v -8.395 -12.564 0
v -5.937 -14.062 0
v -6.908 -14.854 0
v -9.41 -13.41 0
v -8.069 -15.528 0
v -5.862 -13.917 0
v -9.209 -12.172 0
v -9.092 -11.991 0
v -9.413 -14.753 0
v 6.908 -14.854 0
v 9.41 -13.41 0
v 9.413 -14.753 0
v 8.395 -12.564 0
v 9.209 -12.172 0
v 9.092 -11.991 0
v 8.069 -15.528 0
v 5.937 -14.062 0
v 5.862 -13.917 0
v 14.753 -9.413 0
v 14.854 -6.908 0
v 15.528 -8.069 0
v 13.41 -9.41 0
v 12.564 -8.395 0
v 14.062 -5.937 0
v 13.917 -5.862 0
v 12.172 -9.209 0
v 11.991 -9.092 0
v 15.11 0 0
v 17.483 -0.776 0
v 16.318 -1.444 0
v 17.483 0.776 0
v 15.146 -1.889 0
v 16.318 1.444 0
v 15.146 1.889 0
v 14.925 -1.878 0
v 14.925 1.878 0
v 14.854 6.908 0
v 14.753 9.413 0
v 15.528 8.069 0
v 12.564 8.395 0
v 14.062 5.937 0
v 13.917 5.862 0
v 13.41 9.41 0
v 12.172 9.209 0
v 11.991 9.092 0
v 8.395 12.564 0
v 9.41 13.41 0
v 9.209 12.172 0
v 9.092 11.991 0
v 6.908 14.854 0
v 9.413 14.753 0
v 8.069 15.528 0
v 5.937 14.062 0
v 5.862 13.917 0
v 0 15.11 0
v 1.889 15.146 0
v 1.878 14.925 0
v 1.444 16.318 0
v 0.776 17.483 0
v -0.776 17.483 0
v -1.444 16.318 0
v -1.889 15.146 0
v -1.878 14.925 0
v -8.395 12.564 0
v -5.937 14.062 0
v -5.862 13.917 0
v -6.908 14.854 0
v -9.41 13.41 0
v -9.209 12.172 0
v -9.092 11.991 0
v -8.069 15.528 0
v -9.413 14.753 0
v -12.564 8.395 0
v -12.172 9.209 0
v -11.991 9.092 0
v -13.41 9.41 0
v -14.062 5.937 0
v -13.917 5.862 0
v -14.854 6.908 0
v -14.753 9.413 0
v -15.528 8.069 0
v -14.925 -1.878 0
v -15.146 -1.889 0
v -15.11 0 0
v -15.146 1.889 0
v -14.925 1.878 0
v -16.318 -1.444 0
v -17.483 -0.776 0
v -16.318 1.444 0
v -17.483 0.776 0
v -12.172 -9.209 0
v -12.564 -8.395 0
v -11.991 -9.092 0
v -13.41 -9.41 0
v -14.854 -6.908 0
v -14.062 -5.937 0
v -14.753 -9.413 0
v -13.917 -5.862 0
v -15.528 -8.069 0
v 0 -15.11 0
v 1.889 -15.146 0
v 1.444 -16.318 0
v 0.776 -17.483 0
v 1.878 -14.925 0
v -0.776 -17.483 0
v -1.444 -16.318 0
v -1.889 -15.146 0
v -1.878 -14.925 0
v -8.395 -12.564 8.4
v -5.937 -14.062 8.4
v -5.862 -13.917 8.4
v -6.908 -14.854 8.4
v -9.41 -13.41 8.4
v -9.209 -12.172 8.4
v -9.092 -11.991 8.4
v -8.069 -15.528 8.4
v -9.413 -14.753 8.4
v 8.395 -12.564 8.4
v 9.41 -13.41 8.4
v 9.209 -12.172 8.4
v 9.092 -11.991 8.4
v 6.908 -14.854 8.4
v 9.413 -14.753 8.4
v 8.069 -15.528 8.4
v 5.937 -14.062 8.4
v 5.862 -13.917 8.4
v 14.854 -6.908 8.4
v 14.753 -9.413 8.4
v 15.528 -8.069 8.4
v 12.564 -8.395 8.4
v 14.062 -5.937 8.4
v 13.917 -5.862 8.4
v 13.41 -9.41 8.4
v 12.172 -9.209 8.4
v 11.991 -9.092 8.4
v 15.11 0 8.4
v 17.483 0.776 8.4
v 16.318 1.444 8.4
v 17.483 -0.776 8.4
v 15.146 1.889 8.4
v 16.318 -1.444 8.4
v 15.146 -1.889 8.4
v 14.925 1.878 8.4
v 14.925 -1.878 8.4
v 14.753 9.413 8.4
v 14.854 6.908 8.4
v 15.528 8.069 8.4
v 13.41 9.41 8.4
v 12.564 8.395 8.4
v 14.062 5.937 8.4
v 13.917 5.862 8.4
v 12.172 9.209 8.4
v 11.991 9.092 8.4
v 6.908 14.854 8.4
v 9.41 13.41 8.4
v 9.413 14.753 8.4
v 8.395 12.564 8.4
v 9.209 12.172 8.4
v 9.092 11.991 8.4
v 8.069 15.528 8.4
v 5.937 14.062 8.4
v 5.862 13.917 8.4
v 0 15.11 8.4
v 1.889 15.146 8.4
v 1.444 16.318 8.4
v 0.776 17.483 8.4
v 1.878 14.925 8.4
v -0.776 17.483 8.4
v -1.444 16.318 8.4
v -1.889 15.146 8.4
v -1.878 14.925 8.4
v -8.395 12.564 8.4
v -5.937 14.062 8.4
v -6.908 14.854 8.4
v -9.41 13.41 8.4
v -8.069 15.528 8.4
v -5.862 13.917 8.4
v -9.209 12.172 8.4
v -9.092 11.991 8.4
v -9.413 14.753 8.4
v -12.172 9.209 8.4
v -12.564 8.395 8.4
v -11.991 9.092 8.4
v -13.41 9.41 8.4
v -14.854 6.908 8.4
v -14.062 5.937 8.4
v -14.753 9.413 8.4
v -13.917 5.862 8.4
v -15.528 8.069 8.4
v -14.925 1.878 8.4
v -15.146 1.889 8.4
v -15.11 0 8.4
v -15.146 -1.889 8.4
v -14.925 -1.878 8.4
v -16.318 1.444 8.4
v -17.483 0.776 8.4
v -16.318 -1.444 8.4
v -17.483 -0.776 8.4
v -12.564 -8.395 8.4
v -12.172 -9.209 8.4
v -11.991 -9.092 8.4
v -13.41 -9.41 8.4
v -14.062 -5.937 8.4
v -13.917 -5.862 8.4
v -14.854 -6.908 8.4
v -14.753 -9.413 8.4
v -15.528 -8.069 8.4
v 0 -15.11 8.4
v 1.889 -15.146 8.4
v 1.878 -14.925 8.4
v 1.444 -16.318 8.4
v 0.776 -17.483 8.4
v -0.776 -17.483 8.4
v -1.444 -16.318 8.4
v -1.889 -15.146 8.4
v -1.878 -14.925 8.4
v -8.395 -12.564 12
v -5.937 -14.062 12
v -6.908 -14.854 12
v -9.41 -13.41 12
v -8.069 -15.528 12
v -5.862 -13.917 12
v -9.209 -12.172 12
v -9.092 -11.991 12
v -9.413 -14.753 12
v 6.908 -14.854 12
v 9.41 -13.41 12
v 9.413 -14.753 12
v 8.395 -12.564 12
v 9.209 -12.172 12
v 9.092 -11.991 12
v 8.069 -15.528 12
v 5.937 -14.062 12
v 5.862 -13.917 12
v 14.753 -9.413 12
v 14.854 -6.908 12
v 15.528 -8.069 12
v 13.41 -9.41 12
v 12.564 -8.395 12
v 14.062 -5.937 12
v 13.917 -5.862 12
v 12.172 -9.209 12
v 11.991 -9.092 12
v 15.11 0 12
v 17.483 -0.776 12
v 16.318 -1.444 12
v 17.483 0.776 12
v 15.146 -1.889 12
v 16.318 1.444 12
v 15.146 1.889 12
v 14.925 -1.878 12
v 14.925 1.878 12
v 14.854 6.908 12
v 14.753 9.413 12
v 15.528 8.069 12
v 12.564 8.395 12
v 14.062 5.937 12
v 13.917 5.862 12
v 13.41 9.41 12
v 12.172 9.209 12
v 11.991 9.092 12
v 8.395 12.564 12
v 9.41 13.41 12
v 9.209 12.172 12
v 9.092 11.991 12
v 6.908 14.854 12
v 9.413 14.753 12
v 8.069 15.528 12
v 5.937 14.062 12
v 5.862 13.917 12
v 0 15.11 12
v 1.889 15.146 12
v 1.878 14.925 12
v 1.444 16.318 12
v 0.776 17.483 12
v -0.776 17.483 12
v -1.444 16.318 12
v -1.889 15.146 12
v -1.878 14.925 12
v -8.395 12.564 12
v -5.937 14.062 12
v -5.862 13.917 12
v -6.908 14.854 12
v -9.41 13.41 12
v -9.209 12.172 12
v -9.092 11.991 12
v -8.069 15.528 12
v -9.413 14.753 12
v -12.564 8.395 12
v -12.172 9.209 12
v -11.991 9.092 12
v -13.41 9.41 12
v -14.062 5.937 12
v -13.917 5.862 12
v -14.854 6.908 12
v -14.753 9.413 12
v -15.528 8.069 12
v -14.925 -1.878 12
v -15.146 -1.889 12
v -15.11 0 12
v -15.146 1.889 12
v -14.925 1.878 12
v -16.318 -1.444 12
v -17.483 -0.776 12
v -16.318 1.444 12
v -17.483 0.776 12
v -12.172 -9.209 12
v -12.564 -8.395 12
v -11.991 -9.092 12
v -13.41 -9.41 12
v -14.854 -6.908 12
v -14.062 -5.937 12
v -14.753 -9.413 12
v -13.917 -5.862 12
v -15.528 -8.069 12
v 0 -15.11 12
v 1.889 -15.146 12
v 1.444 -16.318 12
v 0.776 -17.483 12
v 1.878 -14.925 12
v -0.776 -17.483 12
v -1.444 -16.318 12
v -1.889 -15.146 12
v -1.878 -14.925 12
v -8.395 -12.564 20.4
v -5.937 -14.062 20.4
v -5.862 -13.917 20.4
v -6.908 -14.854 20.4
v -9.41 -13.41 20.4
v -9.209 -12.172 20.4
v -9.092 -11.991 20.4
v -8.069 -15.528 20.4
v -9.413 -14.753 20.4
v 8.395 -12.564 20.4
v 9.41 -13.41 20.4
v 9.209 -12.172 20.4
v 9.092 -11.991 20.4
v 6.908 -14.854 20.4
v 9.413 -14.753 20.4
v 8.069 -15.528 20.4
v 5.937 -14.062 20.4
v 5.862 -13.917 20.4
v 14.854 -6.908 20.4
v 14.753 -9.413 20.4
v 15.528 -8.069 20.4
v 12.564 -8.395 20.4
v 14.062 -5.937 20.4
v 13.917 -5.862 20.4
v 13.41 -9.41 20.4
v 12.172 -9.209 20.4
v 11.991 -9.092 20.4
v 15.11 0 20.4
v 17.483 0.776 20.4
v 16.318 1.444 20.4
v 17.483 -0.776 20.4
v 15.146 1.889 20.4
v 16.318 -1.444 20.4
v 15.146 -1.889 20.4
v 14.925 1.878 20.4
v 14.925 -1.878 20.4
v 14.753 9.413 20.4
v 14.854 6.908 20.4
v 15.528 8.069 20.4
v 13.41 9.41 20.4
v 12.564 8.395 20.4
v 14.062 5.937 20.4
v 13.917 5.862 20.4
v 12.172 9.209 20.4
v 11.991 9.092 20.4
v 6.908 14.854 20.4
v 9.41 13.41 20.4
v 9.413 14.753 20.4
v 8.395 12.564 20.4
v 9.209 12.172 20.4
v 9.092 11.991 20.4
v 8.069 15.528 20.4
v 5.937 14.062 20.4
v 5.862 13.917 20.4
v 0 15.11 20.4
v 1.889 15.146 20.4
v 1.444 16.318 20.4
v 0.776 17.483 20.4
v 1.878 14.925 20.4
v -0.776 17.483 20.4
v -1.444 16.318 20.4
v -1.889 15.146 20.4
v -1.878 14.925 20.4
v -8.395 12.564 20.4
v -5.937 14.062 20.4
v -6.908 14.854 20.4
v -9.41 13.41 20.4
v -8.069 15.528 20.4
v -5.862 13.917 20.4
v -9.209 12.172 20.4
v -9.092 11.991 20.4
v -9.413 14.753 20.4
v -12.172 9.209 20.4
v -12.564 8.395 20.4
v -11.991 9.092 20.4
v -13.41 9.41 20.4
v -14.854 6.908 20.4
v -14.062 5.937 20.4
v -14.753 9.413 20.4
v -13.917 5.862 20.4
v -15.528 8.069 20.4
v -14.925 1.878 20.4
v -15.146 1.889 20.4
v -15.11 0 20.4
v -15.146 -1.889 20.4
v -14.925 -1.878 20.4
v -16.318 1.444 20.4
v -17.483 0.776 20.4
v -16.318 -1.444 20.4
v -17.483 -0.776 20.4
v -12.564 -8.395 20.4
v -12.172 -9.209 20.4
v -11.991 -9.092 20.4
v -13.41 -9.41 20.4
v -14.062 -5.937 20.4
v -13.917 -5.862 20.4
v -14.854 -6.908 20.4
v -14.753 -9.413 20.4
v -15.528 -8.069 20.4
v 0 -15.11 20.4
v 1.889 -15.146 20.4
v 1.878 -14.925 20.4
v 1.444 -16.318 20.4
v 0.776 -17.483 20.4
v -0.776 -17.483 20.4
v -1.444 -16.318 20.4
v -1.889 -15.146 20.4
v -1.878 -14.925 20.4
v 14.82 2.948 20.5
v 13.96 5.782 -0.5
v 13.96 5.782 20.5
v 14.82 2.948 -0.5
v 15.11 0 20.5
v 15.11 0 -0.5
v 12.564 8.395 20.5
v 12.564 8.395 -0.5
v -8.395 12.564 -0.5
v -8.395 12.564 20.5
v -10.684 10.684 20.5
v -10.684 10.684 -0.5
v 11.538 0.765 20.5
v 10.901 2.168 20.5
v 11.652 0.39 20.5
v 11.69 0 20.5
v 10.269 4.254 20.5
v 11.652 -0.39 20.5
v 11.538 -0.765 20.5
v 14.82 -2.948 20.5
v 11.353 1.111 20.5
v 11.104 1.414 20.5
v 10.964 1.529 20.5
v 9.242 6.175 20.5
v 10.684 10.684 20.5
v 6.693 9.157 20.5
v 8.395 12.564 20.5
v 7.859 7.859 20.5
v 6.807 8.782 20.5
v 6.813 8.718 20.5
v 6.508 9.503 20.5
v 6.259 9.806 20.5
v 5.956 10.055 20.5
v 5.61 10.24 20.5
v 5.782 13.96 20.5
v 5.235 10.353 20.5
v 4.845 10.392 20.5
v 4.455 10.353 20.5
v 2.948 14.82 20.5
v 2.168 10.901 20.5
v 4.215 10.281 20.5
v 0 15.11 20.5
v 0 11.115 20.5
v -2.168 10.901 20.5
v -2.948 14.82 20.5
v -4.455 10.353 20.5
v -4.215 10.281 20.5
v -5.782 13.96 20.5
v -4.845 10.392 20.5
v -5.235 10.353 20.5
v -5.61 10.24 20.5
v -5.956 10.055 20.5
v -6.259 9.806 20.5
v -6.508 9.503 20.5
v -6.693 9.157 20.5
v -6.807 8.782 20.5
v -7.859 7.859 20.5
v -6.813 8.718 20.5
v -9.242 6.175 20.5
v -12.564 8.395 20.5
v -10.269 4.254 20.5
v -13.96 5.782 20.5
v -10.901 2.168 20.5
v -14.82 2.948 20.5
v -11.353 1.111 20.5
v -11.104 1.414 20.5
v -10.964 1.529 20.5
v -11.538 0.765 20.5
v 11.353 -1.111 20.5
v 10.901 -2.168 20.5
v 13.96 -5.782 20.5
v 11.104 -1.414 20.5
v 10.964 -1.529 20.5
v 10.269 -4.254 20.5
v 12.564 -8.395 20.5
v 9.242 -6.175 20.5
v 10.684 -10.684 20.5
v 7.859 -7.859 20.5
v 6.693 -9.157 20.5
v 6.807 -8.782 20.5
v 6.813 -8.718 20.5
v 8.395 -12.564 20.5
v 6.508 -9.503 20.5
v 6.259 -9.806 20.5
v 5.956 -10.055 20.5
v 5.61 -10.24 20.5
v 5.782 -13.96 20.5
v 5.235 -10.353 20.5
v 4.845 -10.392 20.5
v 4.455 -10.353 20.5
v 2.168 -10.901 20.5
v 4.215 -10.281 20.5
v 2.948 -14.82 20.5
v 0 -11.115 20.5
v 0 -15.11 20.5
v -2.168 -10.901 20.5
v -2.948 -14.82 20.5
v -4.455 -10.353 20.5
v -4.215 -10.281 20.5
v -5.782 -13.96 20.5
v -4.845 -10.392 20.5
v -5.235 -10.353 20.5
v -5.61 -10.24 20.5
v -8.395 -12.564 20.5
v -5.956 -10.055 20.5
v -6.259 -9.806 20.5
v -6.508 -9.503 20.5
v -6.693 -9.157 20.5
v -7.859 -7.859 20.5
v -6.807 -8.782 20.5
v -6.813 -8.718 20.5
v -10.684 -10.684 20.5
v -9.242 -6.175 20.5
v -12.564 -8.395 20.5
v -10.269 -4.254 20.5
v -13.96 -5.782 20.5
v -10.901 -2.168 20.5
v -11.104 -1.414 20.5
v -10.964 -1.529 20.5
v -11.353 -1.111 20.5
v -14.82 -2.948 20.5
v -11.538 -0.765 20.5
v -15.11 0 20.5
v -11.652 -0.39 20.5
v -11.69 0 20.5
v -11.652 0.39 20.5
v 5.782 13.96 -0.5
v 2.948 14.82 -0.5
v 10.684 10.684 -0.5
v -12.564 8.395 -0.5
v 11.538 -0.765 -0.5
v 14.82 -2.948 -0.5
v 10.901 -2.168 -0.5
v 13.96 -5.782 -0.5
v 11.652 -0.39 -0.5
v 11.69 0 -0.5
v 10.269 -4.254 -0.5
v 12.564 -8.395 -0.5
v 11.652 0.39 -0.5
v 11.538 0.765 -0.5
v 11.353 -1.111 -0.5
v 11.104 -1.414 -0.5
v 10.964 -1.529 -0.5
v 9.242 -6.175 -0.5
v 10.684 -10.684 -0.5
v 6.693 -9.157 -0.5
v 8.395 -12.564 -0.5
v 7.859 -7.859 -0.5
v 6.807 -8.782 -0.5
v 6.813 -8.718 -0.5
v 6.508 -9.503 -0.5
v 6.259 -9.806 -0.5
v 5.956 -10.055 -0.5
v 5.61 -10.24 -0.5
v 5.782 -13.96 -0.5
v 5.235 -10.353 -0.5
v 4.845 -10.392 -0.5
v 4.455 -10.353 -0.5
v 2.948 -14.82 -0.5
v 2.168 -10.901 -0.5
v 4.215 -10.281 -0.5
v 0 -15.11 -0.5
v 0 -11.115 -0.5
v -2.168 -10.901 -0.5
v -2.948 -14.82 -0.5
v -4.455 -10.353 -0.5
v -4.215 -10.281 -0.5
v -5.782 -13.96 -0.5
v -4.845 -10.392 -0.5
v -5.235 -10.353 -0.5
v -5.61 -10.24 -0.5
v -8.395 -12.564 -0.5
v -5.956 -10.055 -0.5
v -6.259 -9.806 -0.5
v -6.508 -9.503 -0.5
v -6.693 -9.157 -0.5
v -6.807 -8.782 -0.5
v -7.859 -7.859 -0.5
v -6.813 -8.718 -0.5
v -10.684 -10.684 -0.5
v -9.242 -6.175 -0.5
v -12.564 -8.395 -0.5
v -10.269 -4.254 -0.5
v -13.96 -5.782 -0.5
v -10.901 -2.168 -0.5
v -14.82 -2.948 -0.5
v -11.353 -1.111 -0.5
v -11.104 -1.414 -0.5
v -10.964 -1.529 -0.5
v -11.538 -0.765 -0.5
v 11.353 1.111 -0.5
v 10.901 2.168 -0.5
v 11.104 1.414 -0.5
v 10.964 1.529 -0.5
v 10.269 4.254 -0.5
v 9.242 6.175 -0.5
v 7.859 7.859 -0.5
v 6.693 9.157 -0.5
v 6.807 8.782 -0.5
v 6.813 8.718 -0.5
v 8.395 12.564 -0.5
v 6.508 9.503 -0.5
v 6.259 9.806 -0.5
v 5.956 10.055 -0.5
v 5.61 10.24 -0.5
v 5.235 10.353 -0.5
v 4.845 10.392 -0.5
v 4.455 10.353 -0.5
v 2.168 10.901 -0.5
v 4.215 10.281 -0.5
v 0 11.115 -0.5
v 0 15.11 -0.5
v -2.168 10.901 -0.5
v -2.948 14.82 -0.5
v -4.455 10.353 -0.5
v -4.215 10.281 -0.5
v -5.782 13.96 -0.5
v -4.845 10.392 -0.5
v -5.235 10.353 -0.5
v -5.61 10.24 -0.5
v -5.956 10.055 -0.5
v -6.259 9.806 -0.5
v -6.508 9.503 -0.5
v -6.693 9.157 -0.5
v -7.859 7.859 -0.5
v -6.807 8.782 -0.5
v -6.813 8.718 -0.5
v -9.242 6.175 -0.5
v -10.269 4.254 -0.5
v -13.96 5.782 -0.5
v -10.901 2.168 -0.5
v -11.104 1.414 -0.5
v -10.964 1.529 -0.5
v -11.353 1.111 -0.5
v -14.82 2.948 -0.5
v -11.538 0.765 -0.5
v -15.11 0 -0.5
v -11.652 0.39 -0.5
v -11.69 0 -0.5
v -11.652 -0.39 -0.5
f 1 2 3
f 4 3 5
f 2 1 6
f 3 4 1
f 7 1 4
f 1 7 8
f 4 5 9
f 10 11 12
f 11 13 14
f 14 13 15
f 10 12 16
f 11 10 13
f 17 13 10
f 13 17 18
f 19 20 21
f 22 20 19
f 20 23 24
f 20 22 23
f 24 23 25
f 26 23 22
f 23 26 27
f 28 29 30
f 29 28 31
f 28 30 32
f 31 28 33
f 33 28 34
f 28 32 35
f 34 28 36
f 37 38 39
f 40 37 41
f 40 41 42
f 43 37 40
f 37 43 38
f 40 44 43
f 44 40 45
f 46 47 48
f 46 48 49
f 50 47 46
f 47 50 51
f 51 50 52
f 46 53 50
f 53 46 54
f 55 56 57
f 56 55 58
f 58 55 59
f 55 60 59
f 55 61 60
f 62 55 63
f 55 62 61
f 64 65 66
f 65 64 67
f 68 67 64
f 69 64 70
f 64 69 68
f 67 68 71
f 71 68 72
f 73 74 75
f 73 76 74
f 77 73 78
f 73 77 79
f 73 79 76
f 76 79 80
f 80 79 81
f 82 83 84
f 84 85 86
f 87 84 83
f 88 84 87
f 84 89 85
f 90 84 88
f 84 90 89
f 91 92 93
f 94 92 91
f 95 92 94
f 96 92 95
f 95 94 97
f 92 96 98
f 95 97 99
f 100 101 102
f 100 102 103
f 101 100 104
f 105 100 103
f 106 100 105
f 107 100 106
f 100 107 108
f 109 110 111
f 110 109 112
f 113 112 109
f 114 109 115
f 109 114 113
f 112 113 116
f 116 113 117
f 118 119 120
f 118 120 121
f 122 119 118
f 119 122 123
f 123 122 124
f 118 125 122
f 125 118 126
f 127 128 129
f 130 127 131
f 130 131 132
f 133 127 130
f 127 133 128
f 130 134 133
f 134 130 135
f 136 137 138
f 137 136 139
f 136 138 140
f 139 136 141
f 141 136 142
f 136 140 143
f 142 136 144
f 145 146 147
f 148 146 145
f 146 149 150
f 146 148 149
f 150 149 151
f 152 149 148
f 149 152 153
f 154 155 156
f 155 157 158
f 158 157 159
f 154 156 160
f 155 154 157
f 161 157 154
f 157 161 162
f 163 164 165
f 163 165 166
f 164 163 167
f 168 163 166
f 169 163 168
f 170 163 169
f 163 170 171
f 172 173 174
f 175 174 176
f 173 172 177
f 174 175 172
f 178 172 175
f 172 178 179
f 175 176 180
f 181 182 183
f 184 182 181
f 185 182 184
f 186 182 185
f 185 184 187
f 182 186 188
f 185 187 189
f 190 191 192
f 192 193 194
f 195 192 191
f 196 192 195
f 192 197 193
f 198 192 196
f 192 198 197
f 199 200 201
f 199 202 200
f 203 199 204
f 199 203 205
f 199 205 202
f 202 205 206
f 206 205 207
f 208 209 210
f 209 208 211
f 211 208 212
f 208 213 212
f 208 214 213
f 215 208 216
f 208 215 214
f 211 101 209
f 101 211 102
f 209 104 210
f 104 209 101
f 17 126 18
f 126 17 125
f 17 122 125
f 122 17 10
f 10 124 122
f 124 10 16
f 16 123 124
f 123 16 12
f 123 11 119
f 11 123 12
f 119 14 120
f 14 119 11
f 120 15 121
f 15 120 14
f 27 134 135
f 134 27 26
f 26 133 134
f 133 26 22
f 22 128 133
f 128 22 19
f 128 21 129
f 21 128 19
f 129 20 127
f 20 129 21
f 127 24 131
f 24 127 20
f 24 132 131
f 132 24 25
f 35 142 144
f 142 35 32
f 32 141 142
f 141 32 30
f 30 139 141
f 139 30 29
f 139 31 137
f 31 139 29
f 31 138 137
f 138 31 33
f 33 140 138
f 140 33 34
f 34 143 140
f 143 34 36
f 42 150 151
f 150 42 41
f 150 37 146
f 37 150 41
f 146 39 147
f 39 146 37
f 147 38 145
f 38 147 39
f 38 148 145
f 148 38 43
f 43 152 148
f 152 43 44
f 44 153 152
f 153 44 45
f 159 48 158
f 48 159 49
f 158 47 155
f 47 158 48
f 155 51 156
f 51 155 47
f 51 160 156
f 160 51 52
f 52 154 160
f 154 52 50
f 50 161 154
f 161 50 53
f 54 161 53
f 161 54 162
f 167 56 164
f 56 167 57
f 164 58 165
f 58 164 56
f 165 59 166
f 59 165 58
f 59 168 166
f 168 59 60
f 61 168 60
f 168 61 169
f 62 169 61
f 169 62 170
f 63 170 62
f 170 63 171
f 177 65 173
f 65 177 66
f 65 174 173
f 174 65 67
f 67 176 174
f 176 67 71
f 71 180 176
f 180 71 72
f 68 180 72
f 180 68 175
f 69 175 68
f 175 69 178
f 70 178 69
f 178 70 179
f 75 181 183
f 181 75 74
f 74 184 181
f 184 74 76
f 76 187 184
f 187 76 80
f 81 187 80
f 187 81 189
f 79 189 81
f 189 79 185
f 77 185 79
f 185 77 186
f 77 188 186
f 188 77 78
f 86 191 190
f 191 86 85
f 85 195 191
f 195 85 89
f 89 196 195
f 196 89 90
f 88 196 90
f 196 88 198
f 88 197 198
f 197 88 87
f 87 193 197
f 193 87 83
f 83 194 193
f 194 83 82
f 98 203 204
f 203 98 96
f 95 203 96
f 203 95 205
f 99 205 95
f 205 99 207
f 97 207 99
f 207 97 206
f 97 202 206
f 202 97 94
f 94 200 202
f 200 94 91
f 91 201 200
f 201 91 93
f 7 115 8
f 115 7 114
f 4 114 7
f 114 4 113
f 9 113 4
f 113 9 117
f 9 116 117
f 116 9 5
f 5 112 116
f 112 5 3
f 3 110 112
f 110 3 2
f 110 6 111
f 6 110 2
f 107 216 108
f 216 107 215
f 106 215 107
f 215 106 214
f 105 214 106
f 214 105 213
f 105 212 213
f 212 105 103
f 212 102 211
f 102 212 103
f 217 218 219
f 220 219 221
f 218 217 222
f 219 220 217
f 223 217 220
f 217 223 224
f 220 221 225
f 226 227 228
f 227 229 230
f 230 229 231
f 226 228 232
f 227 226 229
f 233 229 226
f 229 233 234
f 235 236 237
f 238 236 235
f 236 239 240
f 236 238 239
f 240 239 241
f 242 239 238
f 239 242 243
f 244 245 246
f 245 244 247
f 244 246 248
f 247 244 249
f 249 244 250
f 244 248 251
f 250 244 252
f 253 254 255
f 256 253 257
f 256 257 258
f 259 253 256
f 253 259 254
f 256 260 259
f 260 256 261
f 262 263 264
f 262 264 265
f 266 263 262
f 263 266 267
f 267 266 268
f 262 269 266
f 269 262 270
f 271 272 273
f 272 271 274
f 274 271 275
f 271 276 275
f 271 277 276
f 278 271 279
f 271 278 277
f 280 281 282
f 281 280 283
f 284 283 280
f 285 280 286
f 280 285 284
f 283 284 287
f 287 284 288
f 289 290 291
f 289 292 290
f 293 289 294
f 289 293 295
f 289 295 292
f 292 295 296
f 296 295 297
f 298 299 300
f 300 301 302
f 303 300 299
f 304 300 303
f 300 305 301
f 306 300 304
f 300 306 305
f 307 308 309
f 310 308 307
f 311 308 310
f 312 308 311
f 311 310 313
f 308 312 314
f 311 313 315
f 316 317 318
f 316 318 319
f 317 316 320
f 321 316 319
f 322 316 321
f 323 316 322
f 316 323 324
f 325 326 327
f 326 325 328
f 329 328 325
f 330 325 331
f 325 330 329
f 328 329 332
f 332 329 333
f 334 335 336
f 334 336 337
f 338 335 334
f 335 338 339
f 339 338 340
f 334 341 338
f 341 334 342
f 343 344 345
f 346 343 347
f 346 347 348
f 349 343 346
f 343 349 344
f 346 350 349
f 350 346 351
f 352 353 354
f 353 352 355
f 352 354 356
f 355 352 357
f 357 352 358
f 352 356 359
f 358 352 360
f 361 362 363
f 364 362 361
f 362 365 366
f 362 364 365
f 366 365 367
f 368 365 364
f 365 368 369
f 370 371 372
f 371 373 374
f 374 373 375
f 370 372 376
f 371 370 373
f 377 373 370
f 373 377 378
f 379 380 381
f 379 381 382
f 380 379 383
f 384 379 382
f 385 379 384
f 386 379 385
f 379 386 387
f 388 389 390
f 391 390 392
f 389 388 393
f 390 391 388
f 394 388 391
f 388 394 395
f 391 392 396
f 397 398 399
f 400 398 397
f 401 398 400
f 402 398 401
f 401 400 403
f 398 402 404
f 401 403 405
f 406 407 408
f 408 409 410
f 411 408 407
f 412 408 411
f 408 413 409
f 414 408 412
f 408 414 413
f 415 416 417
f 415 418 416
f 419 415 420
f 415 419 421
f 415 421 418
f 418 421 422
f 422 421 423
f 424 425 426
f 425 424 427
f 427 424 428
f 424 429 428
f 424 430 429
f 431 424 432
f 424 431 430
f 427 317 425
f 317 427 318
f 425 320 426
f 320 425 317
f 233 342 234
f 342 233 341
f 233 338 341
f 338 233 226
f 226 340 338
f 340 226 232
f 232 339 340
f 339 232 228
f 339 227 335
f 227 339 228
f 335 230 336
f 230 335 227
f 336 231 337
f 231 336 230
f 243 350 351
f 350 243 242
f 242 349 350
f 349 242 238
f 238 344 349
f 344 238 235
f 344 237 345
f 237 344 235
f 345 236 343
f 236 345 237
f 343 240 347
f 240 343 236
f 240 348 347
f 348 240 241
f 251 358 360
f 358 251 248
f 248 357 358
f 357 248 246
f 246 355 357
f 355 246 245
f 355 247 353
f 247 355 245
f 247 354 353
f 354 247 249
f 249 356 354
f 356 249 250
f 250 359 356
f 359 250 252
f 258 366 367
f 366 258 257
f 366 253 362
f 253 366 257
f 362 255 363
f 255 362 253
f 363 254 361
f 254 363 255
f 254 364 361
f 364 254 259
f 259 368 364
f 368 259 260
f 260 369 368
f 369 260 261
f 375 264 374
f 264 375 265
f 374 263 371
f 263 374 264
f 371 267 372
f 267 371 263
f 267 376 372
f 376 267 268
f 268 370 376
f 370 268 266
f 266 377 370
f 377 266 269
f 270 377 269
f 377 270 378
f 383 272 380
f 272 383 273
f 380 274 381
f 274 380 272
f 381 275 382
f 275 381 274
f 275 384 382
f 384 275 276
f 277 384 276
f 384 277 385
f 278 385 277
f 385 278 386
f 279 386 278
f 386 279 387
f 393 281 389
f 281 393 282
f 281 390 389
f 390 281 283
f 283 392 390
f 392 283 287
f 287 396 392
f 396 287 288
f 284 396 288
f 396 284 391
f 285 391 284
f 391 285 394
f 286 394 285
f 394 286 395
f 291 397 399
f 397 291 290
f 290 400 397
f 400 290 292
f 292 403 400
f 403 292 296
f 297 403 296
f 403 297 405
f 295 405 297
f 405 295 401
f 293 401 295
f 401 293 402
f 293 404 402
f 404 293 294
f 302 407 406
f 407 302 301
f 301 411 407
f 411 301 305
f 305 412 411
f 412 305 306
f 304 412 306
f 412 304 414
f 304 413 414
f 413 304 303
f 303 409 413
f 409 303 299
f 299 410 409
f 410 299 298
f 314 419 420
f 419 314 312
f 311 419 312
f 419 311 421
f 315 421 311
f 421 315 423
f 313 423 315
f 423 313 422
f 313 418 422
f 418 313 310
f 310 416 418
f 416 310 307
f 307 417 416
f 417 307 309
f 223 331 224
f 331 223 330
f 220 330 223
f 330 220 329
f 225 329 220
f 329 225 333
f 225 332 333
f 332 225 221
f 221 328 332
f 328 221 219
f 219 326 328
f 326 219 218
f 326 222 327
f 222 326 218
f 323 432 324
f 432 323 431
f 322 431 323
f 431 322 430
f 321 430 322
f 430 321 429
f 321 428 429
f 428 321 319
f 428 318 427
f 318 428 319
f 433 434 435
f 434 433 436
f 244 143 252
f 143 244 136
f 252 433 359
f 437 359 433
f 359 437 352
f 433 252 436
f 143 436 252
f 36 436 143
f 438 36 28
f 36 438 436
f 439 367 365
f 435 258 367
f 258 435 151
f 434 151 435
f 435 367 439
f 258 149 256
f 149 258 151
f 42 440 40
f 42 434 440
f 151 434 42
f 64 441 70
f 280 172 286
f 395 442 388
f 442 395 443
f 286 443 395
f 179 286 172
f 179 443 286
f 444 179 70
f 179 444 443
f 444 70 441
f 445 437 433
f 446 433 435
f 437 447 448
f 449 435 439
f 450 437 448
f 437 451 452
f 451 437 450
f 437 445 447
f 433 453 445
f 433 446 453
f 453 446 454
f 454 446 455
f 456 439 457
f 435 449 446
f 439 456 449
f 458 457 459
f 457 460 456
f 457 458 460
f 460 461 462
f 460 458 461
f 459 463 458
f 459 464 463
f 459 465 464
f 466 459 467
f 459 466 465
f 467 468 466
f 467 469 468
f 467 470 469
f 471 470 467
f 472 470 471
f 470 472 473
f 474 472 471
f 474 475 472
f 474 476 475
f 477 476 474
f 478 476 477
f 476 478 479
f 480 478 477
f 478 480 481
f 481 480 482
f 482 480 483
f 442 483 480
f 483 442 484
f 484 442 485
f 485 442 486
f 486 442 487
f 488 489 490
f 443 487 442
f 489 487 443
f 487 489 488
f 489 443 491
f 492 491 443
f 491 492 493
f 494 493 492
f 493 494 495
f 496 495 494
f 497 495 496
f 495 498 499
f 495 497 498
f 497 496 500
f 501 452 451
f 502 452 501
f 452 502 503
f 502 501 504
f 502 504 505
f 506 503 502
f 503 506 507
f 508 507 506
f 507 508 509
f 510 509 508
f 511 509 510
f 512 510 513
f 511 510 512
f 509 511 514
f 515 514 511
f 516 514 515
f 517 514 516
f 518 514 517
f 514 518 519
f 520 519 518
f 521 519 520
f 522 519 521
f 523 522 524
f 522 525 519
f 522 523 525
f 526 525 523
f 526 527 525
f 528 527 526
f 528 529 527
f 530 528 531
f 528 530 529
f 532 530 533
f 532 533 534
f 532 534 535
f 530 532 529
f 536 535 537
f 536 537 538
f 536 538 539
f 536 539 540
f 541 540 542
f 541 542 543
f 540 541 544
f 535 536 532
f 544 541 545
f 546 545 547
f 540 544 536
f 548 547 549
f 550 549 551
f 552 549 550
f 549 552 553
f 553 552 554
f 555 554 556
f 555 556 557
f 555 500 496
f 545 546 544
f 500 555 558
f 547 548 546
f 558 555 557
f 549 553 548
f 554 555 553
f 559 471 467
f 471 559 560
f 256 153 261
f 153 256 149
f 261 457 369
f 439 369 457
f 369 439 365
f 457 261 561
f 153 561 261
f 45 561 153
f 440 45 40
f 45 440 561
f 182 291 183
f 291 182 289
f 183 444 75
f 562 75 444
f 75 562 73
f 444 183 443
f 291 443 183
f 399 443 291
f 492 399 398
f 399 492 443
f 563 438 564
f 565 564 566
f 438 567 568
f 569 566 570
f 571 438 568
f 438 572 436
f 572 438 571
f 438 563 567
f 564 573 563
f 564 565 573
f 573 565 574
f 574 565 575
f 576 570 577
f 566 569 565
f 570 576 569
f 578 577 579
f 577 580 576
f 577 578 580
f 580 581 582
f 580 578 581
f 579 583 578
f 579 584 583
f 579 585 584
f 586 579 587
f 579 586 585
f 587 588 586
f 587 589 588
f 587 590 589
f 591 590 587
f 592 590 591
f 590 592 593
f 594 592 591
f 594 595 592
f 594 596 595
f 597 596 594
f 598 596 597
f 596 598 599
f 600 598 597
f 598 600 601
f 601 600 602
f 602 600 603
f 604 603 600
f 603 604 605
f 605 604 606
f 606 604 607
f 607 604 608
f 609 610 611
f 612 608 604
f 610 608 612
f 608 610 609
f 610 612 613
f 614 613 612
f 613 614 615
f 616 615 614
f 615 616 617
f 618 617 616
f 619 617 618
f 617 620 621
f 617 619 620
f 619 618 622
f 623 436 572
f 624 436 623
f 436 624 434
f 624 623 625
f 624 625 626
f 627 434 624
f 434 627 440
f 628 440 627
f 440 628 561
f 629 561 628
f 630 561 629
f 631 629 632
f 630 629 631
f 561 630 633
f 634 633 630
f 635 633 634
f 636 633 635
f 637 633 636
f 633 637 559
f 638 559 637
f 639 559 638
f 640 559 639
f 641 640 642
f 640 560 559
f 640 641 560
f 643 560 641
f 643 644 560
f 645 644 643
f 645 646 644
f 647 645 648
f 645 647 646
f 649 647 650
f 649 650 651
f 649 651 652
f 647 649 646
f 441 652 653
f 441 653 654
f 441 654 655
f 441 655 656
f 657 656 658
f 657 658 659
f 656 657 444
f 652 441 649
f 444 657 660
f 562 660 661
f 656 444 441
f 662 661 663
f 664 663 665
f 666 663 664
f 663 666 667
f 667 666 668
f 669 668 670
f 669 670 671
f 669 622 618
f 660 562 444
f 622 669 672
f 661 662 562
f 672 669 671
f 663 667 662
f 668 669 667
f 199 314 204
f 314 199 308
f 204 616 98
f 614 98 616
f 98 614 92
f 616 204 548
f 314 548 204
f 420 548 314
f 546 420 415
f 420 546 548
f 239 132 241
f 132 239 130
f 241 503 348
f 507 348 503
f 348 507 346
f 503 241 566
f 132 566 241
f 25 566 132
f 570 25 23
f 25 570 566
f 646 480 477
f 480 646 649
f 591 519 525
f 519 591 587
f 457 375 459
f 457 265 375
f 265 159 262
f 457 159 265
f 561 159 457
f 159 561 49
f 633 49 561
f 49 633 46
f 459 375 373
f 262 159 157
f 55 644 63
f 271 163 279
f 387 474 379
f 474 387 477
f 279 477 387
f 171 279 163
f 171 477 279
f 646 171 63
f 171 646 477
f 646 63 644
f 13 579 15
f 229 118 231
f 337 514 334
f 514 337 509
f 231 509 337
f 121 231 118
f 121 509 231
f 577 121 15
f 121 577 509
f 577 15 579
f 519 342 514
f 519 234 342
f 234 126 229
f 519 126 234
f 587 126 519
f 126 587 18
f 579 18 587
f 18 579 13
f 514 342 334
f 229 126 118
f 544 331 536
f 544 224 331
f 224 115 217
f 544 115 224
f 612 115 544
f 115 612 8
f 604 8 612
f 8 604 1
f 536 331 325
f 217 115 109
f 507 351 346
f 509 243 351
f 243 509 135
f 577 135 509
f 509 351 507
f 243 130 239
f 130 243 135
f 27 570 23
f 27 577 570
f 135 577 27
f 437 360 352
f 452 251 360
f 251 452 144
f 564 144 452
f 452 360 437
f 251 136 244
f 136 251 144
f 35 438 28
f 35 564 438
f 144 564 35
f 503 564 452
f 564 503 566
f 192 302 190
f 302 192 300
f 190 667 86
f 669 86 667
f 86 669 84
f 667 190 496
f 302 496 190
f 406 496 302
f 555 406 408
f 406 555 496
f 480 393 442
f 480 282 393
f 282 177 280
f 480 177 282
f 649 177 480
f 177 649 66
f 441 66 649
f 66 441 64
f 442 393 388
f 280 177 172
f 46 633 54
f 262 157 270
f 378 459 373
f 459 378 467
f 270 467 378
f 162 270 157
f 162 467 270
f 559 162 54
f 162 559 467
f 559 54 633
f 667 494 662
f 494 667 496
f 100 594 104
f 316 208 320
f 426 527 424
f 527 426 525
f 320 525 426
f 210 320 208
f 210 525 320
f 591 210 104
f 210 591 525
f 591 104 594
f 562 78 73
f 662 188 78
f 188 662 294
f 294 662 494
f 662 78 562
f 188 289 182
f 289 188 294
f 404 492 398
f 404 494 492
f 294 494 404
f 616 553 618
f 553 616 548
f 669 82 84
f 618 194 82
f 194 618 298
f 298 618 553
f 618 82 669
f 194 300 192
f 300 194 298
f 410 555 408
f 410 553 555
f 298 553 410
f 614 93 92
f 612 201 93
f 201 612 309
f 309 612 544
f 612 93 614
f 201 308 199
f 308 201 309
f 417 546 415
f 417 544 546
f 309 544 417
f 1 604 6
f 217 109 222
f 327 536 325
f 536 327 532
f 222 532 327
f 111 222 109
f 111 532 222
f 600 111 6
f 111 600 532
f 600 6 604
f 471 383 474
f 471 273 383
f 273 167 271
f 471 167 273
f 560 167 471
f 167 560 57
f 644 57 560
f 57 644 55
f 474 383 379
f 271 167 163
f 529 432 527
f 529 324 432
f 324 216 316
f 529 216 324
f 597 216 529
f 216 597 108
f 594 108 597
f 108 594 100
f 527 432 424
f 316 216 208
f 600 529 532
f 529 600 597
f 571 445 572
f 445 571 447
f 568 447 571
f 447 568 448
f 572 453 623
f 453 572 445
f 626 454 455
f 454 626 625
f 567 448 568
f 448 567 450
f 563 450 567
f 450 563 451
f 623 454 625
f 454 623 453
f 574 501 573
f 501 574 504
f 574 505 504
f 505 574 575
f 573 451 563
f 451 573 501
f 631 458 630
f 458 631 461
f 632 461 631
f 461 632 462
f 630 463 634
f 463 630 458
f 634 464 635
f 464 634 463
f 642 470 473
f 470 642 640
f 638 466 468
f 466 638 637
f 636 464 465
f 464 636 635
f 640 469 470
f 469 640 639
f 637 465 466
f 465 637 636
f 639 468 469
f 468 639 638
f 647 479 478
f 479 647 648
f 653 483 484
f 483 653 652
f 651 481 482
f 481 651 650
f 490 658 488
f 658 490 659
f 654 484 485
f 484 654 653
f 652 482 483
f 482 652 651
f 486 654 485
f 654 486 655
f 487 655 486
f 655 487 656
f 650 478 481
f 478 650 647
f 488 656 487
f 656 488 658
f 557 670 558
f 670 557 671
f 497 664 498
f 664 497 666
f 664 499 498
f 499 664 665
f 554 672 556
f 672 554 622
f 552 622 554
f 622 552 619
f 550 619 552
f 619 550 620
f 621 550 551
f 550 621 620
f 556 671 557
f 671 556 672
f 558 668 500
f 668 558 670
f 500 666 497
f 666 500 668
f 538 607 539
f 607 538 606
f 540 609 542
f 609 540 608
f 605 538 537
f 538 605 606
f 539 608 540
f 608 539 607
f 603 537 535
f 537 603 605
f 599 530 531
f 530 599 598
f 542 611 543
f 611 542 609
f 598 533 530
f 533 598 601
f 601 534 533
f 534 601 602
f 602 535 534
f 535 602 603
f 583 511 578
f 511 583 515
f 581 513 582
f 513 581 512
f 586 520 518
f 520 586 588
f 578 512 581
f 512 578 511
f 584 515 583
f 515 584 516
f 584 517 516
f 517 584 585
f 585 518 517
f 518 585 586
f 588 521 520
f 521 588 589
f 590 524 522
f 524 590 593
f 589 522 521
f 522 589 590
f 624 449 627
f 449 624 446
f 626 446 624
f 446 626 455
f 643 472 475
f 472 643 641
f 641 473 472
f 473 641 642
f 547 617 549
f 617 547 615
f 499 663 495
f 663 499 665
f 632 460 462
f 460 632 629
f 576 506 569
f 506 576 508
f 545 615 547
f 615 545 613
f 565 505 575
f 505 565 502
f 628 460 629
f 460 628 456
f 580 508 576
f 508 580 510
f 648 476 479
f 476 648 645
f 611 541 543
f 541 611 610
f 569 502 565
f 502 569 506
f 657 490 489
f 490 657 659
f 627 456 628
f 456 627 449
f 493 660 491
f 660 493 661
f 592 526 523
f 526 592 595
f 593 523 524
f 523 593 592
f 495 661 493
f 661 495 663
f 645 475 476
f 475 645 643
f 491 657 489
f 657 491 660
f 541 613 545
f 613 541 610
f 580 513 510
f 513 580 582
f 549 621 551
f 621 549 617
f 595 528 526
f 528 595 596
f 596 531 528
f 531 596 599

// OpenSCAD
$fn = 32;

// ----------------------------------------------------------------------
// Two-module gear rim: z12 m2.5 and z12 m2.5, 20 mm wide
// ----------------------------------------------------------------------

// --- parameters (mm) ---
module_a = 2.5;           // first tooth module
teeth_a = 12;             // first band tooth count
module_b = 2.5;           // second tooth module
teeth_b = 12;             // second band tooth count
band_h = 8;               // height of one tooth band
web_t = 4;                // web thickness between the bands
total = 20;               // overall width over both bands
root_r = 11.88;           // root radius of the coarse band
hub_r = 15.11;            // hub radius
bore_d = 22.23;           // hub bore
hole_count = 6;           // lightening holes
hole_r = 9.69;            // lightening hole circle radius
hole_d = 4;               // lightening hole diameter

band_a = [[11.749, -1.723], [15.146, -1.889], [16.318, -1.444], [17.483, -0.776], [17.483, 0.776], [16.318, 1.444], [15.146, 1.889], [11.749, 1.723], [11.037, 4.383], [14.062, 5.937], [14.854, 6.908], [15.528, 8.069], [14.753, 9.413], [13.41, 9.41], [12.172, 9.209], [9.314, 7.367], [7.367, 9.314], [9.209, 12.172], [9.41, 13.41], [9.413, 14.753], [8.069, 15.528], [6.908, 14.854], [5.937, 14.062], [4.383, 11.037], [1.723, 11.749], [1.889, 15.146], [1.444, 16.318], [0.776, 17.483], [-0.776, 17.483], [-1.444, 16.318], [-1.889, 15.146], [-1.723, 11.749], [-4.383, 11.037], [-5.937, 14.062], [-6.908, 14.854], [-8.069, 15.528], [-9.413, 14.753], [-9.41, 13.41], [-9.209, 12.172], [-7.367, 9.314], [-9.314, 7.367], [-12.172, 9.209], [-13.41, 9.41], [-14.753, 9.413], [-15.528, 8.069], [-14.854, 6.908], [-14.062, 5.937], [-11.037, 4.383], [-11.749, 1.723], [-15.146, 1.889], [-16.318, 1.444], [-17.483, 0.776], [-17.483, -0.776], [-16.318, -1.444], [-15.146, -1.889], [-11.749, -1.723], [-11.037, -4.383], [-14.062, -5.937], [-14.854, -6.908], [-15.528, -8.069], [-14.753, -9.413], [-13.41, -9.41], [-12.172, -9.209], [-9.314, -7.367], [-7.367, -9.314], [-9.209, -12.172], [-9.41, -13.41], [-9.413, -14.753], [-8.069, -15.528], [-6.908, -14.854], [-5.937, -14.062], [-4.383, -11.037], [-1.723, -11.749], [-1.889, -15.146], [-1.444, -16.318], [-0.776, -17.483], [0.776, -17.483], [1.444, -16.318], [1.889, -15.146], [1.723, -11.749], [4.383, -11.037], [5.937, -14.062], [6.908, -14.854], [8.069, -15.528], [9.413, -14.753], [9.41, -13.41], [9.209, -12.172], [7.367, -9.314], [9.314, -7.367], [12.172, -9.209], [13.41, -9.41], [14.753, -9.413], [15.528, -8.069], [14.854, -6.908], [14.062, -5.937], [11.037, -4.383]];
band_b = [[11.749, -1.723], [15.146, -1.889], [16.318, -1.444], [17.483, -0.776], [17.483, 0.776], [16.318, 1.444], [15.146, 1.889], [11.749, 1.723], [11.037, 4.383], [14.062, 5.937], [14.854, 6.908], [15.528, 8.069], [14.753, 9.413], [13.41, 9.41], [12.172, 9.209], [9.314, 7.367], [7.367, 9.314], [9.209, 12.172], [9.41, 13.41], [9.413, 14.753], [8.069, 15.528], [6.908, 14.854], [5.937, 14.062], [4.383, 11.037], [1.723, 11.749], [1.889, 15.146], [1.444, 16.318], [0.776, 17.483], [-0.776, 17.483], [-1.444, 16.318], [-1.889, 15.146], [-1.723, 11.749], [-4.383, 11.037], [-5.937, 14.062], [-6.908, 14.854], [-8.069, 15.528], [-9.413, 14.753], [-9.41, 13.41], [-9.209, 12.172], [-7.367, 9.314], [-9.314, 7.367], [-12.172, 9.209], [-13.41, 9.41], [-14.753, 9.413], [-15.528, 8.069], [-14.854, 6.908], [-14.062, 5.937], [-11.037, 4.383], [-11.749, 1.723], [-15.146, 1.889], [-16.318, 1.444], [-17.483, 0.776], [-17.483, -0.776], [-16.318, -1.444], [-15.146, -1.889], [-11.749, -1.723], [-11.037, -4.383], [-14.062, -5.937], [-14.854, -6.908], [-15.528, -8.069], [-14.753, -9.413], [-13.41, -9.41], [-12.172, -9.209], [-9.314, -7.367], [-7.367, -9.314], [-9.209, -12.172], [-9.41, -13.41], [-9.413, -14.753], [-8.069, -15.528], [-6.908, -14.854], [-5.937, -14.062], [-4.383, -11.037], [-1.723, -11.749], [-1.889, -15.146], [-1.444, -16.318], [-0.776, -17.483], [0.776, -17.483], [1.444, -16.318], [1.889, -15.146], [1.723, -11.749], [4.383, -11.037], [5.937, -14.062], [6.908, -14.854], [8.069, -15.528], [9.413, -14.753], [9.41, -13.41], [9.209, -12.172], [7.367, -9.314], [9.314, -7.367], [12.172, -9.209], [13.41, -9.41], [14.753, -9.413], [15.528, -8.069], [14.854, -6.908], [14.062, -5.937], [11.037, -4.383]];

difference() {
  union() {
    /* tooth band A, overlapping the web by 0.4 mm */
    linear_extrude(height = band_h + 0.4) polygon(band_a);
    /* web */
    translate([0, 0, band_h - 0.4]) cylinder(h = web_t + 0.8, d = 2 * root_r);
    /* tooth band B */
    translate([0, 0, band_h + web_t]) linear_extrude(height = band_h + 0.4) polygon(band_b);
    /* hub */
    translate([0, 0, -0.5]) cylinder(h = total + 1.0, d = 2 * hub_r);
  }
  /* bore */
  translate([0, 0, -2.5]) cylinder(h = total + 5, d = bore_d);
  /* lightening holes through the web */
  for (i = [0 : hole_count - 1]) {
    a = i * 360 / hole_count;
    translate([hole_r * cos(a), hole_r * sin(a), -2.5]) cylinder(h = total + 5, d = hole_d);
  }
}
